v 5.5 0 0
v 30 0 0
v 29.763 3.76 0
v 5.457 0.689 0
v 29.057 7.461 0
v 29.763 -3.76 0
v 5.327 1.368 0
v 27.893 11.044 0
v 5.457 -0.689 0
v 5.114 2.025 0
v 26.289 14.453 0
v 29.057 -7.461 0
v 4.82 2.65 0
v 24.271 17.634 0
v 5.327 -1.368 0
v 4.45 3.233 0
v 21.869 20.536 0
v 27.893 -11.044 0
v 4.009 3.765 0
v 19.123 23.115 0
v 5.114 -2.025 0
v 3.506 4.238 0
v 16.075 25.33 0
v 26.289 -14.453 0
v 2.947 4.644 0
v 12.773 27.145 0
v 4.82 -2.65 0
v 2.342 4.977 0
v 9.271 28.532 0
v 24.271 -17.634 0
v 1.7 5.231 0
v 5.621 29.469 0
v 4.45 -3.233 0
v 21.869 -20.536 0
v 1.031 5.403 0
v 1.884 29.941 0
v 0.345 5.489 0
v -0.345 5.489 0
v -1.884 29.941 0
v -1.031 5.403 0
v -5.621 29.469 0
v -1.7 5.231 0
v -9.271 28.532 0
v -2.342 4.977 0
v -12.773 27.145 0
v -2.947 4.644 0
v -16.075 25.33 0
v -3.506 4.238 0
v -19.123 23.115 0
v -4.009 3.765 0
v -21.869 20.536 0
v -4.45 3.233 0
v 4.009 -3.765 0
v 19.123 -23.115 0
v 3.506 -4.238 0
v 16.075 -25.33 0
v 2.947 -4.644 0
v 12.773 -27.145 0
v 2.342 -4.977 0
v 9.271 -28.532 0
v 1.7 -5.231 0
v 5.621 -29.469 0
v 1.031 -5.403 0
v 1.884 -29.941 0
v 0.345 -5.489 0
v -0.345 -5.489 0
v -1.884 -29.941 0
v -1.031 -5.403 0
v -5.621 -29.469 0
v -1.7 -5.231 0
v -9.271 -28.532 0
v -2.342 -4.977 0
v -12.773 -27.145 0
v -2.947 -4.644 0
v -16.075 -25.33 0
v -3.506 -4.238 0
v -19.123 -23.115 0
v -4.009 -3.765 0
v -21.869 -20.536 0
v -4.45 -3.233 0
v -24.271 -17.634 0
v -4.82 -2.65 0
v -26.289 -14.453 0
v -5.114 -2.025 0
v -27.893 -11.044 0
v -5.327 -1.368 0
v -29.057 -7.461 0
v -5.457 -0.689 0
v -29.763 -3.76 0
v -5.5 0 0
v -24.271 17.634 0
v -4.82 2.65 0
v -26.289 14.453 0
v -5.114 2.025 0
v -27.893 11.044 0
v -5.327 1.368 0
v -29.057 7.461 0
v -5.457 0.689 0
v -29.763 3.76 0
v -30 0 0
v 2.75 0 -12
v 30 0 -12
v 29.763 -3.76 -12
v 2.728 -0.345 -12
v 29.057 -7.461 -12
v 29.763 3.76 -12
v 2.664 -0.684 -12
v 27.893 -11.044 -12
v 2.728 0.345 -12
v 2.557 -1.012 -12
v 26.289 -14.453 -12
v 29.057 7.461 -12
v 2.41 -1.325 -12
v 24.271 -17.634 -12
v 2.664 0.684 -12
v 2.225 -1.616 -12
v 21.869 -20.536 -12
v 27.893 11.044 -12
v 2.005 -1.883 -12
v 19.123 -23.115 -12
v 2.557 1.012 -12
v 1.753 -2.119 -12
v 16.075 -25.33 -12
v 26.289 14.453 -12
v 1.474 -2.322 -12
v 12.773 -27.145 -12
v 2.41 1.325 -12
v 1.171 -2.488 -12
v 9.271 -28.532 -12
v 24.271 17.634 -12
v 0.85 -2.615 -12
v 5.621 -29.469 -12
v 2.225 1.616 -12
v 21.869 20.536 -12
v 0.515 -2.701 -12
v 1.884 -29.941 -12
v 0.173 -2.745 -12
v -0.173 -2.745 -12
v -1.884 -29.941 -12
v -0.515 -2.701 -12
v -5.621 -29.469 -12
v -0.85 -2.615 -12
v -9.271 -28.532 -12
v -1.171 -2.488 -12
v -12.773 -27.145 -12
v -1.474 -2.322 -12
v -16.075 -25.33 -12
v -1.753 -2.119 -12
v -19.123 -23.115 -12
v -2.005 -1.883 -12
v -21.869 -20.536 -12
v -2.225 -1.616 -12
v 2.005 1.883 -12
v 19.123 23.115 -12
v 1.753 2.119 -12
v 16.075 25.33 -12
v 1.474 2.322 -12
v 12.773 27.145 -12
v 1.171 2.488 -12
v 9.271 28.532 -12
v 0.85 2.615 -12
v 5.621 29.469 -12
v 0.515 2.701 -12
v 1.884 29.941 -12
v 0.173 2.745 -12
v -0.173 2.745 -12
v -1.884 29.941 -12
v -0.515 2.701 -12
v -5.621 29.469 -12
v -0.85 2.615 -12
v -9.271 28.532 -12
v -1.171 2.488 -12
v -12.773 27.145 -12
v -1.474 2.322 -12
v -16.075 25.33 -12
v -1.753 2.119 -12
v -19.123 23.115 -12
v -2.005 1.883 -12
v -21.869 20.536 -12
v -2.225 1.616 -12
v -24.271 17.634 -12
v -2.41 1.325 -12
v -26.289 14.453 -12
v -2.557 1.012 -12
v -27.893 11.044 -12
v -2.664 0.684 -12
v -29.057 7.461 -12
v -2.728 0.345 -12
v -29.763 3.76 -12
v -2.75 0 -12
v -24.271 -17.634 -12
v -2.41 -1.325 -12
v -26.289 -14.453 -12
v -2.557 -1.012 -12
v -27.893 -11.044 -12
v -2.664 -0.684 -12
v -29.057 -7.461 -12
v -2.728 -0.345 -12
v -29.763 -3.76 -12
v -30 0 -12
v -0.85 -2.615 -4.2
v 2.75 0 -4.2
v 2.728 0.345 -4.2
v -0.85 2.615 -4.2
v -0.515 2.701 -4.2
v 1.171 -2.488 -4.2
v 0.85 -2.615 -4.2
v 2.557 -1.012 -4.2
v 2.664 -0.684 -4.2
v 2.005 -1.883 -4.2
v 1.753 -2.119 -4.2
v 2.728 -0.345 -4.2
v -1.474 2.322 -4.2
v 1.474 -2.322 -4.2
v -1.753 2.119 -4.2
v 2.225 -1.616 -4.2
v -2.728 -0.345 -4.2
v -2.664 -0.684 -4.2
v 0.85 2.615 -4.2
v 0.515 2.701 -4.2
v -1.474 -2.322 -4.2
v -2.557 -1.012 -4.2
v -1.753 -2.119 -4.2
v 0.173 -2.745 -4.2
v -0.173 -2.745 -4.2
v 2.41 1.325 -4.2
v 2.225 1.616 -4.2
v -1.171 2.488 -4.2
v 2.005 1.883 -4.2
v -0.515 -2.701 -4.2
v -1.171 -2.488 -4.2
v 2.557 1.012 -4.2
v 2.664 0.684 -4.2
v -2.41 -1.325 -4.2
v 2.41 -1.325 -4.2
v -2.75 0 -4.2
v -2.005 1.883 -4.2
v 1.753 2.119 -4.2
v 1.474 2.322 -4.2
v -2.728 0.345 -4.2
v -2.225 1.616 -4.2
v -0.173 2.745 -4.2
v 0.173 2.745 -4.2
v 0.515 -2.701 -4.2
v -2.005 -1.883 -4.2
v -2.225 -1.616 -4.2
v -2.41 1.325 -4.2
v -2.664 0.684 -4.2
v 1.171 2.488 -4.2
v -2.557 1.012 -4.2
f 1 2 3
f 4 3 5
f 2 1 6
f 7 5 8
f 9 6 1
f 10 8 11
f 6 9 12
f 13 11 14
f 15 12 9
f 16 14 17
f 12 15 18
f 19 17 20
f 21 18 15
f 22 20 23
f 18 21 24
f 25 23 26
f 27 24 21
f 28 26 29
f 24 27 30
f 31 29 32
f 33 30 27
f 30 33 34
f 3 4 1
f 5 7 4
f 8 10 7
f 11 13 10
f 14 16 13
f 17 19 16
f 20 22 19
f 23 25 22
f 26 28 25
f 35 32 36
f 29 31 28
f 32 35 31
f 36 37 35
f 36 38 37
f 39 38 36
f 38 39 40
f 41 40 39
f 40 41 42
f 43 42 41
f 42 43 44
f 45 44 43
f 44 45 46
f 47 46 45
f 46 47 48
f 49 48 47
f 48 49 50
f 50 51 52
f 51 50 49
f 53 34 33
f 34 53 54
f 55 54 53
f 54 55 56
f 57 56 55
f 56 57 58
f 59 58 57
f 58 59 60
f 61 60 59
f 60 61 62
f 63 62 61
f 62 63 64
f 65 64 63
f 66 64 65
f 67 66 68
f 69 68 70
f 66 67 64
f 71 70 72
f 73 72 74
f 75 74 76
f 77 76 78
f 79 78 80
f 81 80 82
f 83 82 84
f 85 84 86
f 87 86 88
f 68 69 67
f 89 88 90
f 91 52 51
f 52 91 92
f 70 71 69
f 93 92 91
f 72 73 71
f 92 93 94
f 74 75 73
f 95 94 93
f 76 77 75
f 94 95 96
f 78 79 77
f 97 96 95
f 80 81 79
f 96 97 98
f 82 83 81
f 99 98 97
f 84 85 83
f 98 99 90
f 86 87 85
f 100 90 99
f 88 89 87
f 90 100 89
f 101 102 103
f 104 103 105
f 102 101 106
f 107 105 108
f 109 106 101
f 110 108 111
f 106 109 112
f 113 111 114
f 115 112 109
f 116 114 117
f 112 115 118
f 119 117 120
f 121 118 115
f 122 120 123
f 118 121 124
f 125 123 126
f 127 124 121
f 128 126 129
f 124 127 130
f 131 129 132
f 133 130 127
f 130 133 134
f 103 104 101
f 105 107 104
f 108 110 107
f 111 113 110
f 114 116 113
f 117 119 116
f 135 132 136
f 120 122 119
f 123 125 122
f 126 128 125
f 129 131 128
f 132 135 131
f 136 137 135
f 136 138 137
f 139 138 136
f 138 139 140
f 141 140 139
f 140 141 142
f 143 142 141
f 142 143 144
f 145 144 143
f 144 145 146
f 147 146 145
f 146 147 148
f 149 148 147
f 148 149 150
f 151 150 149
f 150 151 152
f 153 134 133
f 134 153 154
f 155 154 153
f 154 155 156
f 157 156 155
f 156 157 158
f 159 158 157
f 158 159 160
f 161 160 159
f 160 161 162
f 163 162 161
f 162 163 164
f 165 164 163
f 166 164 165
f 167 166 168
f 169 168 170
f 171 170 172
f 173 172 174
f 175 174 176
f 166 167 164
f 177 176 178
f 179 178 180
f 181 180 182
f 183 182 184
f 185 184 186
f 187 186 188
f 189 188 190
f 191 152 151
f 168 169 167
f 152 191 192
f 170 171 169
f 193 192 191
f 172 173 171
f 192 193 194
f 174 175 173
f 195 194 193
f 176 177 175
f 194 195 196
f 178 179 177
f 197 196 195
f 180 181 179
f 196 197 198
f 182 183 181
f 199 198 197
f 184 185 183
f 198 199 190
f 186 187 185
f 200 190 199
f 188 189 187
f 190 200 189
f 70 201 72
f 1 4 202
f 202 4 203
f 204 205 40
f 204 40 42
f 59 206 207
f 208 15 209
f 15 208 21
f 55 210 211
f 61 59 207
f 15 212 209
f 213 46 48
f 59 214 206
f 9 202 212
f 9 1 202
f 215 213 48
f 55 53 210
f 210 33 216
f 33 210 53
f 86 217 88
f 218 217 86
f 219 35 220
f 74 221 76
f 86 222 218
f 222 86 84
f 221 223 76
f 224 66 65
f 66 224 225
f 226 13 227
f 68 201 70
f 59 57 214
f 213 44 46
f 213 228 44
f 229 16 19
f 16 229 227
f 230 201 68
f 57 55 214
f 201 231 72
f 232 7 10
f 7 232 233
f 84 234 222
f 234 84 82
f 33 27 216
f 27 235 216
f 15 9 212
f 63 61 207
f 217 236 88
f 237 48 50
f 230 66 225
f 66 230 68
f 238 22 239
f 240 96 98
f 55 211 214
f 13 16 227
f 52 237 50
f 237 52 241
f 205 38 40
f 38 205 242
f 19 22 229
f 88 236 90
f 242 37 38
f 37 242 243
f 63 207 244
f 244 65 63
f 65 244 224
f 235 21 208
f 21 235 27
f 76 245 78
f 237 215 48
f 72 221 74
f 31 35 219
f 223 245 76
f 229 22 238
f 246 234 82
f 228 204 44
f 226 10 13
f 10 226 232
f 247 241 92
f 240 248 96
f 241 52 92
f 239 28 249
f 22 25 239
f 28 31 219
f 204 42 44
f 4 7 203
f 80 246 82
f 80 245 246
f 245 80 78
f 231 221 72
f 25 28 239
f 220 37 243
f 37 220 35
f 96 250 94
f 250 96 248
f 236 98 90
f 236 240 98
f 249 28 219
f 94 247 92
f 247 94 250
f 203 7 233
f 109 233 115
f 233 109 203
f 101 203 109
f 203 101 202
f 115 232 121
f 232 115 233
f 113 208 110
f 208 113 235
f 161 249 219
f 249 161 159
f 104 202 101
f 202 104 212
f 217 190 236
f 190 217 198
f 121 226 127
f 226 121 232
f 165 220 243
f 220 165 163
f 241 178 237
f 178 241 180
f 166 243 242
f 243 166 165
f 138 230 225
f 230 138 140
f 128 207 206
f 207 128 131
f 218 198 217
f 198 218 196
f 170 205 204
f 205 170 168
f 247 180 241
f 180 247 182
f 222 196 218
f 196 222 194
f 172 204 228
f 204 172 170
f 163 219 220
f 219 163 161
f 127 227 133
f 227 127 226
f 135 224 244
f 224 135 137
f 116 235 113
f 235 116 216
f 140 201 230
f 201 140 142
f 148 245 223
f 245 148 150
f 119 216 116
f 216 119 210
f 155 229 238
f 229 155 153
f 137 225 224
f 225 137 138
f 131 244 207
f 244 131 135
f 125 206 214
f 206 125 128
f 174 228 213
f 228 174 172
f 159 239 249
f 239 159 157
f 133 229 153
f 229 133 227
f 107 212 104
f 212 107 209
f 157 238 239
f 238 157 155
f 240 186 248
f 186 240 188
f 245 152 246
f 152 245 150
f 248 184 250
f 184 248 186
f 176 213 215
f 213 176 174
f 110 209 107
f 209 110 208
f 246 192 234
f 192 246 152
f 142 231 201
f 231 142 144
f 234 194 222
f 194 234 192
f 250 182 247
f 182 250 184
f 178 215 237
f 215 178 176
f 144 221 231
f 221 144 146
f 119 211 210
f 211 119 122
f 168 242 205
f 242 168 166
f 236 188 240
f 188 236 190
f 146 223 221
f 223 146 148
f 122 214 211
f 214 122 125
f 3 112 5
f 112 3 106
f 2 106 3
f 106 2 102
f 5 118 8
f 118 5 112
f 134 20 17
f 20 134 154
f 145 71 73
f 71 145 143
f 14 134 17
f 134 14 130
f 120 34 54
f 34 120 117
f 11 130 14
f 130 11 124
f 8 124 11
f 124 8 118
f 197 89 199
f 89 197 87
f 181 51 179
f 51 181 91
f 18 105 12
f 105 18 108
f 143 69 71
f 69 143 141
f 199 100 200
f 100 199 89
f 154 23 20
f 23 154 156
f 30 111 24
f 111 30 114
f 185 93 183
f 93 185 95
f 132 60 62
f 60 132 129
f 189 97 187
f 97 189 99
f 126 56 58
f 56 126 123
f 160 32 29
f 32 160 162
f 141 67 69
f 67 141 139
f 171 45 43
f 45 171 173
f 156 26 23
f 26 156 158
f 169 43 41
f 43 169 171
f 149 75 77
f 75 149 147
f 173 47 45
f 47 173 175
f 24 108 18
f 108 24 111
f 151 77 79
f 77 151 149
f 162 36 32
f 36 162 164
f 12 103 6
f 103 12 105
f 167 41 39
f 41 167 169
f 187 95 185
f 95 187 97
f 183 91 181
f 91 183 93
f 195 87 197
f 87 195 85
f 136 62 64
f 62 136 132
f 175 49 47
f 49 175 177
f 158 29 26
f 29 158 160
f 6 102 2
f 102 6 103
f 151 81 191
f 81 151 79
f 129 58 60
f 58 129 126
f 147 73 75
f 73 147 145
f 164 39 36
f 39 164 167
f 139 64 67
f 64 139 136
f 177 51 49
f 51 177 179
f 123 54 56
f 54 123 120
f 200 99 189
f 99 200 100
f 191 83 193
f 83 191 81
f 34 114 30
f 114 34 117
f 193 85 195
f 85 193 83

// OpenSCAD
$fn = 50;


difference() {
	union() {
		translate(v = [0, 0, -12.0000000000]) {
			cylinder(h = 12, r = 30.0000000000);
		}
	}
	union() {
		translate(v = [0, 0, 0]) {
			rotate(a = [0, 0, 0]) {
				difference() {
					union() {
						translate(v = [0, 0, -12.0000000000]) {
							cylinder(h = 12, r = 2.2500000000);
						}
						translate(v = [0, 0, -4.2000000000]) {
							cylinder(h = 4.2000000000, r1 = 2.7500000000, r2 = 5.5000000000);
						}
						translate(v = [0, 0, -12.0000000000]) {
							cylinder(h = 12, r = 2.7500000000);
						}
						translate(v = [0, 0, -12.0000000000]) {
							cylinder(h = 12, r = 2.2500000000);
						}
					}
					union();
				}
			}
		}
	}
}
